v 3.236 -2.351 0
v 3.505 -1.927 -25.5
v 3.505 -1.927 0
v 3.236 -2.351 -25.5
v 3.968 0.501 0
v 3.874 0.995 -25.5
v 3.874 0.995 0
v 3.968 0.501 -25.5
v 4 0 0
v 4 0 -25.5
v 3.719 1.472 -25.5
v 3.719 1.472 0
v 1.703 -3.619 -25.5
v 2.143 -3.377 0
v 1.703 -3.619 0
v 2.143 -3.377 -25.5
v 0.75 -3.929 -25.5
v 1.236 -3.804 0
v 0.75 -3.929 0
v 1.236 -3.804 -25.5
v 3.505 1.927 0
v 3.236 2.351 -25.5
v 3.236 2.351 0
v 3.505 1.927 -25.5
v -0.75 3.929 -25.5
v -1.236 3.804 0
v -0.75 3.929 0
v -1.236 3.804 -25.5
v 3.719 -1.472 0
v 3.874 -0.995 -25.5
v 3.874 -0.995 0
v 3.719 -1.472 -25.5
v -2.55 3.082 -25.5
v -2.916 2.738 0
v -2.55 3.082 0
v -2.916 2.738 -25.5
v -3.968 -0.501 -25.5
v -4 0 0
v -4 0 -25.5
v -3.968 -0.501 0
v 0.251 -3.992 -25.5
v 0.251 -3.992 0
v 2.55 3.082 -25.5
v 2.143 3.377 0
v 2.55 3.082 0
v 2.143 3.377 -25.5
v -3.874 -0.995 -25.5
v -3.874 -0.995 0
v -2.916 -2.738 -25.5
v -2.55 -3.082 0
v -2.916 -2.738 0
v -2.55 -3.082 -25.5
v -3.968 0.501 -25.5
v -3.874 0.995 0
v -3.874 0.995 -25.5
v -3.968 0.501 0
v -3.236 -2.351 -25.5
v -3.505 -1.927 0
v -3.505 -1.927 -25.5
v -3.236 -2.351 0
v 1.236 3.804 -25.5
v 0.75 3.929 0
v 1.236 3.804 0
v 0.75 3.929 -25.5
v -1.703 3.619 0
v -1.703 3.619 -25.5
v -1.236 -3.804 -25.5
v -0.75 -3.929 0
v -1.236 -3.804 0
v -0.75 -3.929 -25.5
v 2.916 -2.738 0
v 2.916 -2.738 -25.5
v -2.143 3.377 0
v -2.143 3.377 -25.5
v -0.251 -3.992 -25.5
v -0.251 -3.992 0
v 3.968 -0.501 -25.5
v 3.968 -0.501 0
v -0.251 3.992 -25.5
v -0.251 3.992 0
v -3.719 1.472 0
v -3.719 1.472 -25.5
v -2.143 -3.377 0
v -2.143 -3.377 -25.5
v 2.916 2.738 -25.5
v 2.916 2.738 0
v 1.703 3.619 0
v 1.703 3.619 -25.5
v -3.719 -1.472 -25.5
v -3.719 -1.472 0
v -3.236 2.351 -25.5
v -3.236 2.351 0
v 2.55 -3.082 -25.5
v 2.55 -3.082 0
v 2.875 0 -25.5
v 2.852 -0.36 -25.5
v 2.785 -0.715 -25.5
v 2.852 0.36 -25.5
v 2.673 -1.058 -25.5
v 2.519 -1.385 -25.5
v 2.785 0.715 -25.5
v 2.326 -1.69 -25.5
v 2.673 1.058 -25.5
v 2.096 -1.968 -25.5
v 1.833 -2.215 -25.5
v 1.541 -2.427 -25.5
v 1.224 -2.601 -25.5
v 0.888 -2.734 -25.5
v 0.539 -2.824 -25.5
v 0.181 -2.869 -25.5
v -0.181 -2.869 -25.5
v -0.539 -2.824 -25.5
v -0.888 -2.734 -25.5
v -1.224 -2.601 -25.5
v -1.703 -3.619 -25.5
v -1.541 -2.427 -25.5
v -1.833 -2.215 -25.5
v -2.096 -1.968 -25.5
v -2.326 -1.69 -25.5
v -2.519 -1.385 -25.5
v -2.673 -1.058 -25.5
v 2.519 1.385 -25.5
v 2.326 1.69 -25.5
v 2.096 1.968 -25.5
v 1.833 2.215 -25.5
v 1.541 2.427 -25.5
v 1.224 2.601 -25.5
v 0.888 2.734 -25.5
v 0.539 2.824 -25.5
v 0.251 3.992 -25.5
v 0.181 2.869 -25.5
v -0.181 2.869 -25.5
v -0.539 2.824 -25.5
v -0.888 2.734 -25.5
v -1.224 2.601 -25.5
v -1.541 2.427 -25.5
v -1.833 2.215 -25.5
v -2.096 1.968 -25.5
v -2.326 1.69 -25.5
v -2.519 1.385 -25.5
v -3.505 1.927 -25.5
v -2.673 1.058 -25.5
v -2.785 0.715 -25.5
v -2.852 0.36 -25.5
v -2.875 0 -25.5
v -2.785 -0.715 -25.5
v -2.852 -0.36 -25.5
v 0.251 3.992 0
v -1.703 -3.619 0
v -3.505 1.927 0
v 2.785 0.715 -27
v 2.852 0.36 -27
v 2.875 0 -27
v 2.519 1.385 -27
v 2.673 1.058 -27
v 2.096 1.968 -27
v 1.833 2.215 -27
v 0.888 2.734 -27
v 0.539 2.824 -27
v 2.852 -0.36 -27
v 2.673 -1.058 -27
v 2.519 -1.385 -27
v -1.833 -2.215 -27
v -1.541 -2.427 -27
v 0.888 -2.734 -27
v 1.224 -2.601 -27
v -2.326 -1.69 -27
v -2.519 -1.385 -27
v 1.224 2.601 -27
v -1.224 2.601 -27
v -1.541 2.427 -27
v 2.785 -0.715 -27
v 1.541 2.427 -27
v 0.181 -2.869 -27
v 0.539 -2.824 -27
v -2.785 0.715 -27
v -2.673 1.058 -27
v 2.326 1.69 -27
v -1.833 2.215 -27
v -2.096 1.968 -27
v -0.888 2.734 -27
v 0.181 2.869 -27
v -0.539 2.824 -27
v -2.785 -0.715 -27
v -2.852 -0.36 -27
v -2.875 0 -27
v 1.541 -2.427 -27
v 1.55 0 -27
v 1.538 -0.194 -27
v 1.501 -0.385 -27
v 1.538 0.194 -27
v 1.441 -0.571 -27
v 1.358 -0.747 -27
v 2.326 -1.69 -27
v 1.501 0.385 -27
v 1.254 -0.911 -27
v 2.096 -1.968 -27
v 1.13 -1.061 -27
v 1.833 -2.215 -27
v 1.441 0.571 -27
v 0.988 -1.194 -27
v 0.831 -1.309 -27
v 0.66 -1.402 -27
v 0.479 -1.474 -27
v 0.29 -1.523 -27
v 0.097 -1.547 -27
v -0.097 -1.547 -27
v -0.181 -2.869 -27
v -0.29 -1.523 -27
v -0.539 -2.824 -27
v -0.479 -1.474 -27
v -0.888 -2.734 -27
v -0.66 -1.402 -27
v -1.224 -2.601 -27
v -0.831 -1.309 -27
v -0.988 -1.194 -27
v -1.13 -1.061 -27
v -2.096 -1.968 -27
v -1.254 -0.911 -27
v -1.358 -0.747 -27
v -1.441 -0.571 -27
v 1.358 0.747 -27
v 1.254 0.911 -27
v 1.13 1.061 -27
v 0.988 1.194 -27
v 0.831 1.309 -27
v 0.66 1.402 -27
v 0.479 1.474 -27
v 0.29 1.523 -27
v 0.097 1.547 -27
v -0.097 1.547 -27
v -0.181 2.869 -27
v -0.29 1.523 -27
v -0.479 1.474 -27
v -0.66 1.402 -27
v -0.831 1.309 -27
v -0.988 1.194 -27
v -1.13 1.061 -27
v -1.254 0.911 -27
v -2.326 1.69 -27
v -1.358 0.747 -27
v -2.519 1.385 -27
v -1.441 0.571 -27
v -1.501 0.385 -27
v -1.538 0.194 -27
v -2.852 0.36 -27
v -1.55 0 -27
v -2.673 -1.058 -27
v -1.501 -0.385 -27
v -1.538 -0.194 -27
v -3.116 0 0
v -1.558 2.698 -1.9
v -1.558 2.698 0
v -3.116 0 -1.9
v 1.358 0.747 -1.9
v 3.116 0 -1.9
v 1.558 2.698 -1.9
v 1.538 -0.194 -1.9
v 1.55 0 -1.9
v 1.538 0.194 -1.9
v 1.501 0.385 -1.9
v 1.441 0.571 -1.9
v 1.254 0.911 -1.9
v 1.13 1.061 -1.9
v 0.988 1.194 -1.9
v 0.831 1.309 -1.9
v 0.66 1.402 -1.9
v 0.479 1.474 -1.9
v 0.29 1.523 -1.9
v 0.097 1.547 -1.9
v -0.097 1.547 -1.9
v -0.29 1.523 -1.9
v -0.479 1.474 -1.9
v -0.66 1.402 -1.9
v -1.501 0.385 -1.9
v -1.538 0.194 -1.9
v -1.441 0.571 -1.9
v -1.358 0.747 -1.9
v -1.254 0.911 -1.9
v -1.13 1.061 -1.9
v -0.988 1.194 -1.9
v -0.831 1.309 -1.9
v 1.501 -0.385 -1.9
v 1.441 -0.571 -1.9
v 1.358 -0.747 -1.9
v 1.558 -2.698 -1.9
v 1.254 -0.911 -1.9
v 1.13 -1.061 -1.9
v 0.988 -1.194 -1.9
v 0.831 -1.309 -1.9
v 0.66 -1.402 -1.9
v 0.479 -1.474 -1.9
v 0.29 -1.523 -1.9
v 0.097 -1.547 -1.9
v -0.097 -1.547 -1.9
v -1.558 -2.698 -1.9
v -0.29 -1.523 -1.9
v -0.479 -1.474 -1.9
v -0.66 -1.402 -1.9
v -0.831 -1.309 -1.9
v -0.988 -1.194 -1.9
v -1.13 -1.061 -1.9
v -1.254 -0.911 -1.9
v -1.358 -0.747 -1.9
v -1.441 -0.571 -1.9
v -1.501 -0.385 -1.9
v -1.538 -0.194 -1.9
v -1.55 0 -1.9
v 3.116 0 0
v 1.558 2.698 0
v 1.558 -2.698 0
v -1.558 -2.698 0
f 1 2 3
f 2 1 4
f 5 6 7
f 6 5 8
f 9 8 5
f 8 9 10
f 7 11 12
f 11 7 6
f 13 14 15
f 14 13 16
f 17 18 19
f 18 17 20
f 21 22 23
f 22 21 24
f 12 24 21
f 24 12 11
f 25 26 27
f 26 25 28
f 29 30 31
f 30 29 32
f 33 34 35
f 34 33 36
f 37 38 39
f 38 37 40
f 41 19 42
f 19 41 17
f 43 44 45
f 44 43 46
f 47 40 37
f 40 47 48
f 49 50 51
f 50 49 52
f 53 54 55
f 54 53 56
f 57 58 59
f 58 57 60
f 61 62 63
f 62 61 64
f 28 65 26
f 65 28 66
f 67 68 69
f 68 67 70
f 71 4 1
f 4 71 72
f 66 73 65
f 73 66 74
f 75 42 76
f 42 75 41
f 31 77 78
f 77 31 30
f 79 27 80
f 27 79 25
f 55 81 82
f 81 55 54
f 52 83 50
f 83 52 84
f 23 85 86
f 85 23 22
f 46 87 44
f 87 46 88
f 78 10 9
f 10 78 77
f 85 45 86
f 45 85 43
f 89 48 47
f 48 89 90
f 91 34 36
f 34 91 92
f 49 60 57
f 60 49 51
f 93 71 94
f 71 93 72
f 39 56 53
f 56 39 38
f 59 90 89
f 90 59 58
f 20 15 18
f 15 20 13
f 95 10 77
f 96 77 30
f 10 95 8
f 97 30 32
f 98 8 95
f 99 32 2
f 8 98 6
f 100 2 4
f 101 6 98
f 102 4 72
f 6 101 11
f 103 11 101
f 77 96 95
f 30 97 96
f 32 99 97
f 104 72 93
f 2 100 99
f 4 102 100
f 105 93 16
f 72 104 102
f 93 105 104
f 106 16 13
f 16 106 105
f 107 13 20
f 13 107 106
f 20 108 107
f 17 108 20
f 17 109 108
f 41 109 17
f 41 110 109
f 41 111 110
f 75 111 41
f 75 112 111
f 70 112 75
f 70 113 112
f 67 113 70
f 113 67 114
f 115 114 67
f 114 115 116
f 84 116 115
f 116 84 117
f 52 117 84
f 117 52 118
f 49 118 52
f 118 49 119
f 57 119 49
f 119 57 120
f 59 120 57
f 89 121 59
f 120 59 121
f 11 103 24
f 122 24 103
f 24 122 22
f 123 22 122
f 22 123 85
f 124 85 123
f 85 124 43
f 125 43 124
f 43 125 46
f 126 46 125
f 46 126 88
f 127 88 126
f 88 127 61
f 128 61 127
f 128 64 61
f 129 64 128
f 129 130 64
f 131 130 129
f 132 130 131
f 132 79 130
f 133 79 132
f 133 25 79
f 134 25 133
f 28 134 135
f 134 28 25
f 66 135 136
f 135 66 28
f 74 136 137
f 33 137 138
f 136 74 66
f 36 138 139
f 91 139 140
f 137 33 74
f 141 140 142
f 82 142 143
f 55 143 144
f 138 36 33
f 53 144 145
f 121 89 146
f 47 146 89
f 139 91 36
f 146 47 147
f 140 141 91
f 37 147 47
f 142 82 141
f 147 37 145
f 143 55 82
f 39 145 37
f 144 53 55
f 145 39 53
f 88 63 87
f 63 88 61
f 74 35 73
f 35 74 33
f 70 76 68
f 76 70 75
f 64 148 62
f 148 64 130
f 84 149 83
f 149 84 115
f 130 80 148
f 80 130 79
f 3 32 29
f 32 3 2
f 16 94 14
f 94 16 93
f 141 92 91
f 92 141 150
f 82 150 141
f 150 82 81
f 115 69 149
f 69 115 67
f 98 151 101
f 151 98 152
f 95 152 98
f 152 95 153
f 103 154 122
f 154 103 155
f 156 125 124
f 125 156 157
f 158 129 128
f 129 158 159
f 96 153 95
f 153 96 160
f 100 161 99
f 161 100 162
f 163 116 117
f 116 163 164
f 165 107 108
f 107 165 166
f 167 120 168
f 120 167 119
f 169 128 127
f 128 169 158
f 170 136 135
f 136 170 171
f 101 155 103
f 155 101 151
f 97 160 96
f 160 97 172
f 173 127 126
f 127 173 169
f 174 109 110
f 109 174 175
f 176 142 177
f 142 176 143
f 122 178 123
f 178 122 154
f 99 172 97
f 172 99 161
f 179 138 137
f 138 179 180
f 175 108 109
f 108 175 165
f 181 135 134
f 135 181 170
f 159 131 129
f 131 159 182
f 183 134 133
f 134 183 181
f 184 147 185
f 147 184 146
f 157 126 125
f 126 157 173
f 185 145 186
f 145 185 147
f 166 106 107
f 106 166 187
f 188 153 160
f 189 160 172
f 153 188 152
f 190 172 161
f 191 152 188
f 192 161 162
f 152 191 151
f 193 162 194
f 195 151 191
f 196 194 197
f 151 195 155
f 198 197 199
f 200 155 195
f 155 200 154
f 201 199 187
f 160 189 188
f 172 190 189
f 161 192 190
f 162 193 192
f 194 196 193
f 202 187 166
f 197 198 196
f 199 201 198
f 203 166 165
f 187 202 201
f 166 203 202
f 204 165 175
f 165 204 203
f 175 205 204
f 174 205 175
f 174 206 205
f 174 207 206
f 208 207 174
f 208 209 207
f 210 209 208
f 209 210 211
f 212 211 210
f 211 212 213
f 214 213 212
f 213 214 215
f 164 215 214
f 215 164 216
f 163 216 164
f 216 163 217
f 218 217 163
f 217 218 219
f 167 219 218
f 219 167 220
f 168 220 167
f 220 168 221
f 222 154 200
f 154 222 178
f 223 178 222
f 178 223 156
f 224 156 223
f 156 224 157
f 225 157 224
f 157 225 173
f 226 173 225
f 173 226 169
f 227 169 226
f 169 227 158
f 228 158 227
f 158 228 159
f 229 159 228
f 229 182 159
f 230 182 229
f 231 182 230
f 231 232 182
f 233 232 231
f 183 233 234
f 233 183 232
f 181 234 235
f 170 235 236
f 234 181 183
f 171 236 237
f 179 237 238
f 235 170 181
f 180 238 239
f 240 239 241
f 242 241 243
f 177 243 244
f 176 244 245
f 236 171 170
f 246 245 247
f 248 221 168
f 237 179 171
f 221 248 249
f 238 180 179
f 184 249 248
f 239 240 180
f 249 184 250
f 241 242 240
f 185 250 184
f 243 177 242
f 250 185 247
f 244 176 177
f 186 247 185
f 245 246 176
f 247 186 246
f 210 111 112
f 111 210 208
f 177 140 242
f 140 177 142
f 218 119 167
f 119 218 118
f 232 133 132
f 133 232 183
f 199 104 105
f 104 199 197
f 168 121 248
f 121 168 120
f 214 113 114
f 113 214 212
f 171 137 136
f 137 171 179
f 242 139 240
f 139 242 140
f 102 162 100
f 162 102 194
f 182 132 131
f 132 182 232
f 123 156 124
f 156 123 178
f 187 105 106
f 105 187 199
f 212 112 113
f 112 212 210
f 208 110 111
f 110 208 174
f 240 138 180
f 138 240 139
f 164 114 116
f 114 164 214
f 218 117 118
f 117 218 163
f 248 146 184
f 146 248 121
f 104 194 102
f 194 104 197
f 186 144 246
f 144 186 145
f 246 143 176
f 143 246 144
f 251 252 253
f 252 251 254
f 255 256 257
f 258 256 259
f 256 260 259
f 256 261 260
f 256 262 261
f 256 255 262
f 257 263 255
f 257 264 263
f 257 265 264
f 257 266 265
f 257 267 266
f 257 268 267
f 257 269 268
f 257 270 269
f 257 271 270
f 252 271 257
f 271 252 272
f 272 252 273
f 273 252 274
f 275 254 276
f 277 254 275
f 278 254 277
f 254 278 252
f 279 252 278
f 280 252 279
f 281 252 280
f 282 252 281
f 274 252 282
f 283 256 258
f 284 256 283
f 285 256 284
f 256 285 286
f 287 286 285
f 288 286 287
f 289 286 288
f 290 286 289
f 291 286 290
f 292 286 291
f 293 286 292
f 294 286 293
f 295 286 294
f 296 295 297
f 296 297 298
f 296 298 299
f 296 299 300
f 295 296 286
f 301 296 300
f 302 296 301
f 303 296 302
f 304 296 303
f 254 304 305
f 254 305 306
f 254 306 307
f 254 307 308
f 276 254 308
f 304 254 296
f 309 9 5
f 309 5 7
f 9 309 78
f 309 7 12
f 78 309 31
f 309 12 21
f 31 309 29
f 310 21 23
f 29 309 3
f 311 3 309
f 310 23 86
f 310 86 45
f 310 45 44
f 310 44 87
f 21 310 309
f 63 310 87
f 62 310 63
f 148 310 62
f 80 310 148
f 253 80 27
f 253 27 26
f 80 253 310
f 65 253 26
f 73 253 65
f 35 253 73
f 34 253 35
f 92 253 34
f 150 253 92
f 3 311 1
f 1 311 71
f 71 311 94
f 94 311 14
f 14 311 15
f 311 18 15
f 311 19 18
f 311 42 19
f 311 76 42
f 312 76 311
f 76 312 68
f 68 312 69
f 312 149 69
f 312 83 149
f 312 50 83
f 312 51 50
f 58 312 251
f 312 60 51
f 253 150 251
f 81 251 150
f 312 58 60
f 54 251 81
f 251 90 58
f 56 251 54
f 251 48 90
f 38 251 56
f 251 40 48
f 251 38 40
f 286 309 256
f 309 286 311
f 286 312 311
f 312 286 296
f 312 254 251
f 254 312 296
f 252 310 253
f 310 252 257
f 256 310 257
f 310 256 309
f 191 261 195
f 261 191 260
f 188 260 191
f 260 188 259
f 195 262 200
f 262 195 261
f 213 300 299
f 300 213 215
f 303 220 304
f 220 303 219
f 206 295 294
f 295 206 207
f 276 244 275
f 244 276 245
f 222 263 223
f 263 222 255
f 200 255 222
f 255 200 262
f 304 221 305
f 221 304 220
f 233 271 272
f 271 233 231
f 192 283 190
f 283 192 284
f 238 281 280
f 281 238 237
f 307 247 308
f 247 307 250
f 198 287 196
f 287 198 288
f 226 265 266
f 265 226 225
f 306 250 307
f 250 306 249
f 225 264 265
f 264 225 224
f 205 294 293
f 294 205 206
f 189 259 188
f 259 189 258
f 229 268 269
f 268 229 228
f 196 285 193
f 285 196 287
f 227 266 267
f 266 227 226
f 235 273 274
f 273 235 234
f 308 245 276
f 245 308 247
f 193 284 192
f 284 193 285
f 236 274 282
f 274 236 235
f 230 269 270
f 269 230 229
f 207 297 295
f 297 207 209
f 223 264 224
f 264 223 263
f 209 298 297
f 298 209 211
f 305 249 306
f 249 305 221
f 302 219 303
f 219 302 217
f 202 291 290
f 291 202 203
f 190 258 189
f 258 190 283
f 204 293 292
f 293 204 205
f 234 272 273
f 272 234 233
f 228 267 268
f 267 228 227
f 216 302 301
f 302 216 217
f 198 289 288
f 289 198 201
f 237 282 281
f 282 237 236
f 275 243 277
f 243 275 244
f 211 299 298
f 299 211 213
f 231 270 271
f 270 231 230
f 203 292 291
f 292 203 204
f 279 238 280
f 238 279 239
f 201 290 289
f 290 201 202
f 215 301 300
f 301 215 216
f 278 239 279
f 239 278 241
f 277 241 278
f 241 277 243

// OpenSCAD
$fn = 50;

difference() {
	union() {
		translate(v = [0, 0, -25.5]) {
			cylinder(h = 28.5, r = 4.0);
		}
		#translate(v = [0, 0, -27.0]) {
			cylinder(h = 27, r = 2.875);
		}
	}
	union() {
		translate(v = [0, 0, 0]) {
			rotate(a = [0, 0, 0]) {
				difference() {
					union() {
						translate(v = [0, 0, -1.9]) {
							linear_extrude(height = 1.9) {
								polygon(points = [[3.1158, 0.0], [1.5579000000000005, 2.698361953111554], [-1.5578999999999994, 2.6983619531115544], [-3.1158, 3.815754496783323e-16], [-1.5579000000000014, -2.6983619531115535], [1.557899999999998, -2.6983619531115552]]);
							}
						}
					}
					union();
				}
			}
		}
		#cylinder(h = 3, r = 5.0);
		#translate(v = [0, 0, -100.0]) {
			cylinder(h = 200, r = 1.55);
		}
	}
}
